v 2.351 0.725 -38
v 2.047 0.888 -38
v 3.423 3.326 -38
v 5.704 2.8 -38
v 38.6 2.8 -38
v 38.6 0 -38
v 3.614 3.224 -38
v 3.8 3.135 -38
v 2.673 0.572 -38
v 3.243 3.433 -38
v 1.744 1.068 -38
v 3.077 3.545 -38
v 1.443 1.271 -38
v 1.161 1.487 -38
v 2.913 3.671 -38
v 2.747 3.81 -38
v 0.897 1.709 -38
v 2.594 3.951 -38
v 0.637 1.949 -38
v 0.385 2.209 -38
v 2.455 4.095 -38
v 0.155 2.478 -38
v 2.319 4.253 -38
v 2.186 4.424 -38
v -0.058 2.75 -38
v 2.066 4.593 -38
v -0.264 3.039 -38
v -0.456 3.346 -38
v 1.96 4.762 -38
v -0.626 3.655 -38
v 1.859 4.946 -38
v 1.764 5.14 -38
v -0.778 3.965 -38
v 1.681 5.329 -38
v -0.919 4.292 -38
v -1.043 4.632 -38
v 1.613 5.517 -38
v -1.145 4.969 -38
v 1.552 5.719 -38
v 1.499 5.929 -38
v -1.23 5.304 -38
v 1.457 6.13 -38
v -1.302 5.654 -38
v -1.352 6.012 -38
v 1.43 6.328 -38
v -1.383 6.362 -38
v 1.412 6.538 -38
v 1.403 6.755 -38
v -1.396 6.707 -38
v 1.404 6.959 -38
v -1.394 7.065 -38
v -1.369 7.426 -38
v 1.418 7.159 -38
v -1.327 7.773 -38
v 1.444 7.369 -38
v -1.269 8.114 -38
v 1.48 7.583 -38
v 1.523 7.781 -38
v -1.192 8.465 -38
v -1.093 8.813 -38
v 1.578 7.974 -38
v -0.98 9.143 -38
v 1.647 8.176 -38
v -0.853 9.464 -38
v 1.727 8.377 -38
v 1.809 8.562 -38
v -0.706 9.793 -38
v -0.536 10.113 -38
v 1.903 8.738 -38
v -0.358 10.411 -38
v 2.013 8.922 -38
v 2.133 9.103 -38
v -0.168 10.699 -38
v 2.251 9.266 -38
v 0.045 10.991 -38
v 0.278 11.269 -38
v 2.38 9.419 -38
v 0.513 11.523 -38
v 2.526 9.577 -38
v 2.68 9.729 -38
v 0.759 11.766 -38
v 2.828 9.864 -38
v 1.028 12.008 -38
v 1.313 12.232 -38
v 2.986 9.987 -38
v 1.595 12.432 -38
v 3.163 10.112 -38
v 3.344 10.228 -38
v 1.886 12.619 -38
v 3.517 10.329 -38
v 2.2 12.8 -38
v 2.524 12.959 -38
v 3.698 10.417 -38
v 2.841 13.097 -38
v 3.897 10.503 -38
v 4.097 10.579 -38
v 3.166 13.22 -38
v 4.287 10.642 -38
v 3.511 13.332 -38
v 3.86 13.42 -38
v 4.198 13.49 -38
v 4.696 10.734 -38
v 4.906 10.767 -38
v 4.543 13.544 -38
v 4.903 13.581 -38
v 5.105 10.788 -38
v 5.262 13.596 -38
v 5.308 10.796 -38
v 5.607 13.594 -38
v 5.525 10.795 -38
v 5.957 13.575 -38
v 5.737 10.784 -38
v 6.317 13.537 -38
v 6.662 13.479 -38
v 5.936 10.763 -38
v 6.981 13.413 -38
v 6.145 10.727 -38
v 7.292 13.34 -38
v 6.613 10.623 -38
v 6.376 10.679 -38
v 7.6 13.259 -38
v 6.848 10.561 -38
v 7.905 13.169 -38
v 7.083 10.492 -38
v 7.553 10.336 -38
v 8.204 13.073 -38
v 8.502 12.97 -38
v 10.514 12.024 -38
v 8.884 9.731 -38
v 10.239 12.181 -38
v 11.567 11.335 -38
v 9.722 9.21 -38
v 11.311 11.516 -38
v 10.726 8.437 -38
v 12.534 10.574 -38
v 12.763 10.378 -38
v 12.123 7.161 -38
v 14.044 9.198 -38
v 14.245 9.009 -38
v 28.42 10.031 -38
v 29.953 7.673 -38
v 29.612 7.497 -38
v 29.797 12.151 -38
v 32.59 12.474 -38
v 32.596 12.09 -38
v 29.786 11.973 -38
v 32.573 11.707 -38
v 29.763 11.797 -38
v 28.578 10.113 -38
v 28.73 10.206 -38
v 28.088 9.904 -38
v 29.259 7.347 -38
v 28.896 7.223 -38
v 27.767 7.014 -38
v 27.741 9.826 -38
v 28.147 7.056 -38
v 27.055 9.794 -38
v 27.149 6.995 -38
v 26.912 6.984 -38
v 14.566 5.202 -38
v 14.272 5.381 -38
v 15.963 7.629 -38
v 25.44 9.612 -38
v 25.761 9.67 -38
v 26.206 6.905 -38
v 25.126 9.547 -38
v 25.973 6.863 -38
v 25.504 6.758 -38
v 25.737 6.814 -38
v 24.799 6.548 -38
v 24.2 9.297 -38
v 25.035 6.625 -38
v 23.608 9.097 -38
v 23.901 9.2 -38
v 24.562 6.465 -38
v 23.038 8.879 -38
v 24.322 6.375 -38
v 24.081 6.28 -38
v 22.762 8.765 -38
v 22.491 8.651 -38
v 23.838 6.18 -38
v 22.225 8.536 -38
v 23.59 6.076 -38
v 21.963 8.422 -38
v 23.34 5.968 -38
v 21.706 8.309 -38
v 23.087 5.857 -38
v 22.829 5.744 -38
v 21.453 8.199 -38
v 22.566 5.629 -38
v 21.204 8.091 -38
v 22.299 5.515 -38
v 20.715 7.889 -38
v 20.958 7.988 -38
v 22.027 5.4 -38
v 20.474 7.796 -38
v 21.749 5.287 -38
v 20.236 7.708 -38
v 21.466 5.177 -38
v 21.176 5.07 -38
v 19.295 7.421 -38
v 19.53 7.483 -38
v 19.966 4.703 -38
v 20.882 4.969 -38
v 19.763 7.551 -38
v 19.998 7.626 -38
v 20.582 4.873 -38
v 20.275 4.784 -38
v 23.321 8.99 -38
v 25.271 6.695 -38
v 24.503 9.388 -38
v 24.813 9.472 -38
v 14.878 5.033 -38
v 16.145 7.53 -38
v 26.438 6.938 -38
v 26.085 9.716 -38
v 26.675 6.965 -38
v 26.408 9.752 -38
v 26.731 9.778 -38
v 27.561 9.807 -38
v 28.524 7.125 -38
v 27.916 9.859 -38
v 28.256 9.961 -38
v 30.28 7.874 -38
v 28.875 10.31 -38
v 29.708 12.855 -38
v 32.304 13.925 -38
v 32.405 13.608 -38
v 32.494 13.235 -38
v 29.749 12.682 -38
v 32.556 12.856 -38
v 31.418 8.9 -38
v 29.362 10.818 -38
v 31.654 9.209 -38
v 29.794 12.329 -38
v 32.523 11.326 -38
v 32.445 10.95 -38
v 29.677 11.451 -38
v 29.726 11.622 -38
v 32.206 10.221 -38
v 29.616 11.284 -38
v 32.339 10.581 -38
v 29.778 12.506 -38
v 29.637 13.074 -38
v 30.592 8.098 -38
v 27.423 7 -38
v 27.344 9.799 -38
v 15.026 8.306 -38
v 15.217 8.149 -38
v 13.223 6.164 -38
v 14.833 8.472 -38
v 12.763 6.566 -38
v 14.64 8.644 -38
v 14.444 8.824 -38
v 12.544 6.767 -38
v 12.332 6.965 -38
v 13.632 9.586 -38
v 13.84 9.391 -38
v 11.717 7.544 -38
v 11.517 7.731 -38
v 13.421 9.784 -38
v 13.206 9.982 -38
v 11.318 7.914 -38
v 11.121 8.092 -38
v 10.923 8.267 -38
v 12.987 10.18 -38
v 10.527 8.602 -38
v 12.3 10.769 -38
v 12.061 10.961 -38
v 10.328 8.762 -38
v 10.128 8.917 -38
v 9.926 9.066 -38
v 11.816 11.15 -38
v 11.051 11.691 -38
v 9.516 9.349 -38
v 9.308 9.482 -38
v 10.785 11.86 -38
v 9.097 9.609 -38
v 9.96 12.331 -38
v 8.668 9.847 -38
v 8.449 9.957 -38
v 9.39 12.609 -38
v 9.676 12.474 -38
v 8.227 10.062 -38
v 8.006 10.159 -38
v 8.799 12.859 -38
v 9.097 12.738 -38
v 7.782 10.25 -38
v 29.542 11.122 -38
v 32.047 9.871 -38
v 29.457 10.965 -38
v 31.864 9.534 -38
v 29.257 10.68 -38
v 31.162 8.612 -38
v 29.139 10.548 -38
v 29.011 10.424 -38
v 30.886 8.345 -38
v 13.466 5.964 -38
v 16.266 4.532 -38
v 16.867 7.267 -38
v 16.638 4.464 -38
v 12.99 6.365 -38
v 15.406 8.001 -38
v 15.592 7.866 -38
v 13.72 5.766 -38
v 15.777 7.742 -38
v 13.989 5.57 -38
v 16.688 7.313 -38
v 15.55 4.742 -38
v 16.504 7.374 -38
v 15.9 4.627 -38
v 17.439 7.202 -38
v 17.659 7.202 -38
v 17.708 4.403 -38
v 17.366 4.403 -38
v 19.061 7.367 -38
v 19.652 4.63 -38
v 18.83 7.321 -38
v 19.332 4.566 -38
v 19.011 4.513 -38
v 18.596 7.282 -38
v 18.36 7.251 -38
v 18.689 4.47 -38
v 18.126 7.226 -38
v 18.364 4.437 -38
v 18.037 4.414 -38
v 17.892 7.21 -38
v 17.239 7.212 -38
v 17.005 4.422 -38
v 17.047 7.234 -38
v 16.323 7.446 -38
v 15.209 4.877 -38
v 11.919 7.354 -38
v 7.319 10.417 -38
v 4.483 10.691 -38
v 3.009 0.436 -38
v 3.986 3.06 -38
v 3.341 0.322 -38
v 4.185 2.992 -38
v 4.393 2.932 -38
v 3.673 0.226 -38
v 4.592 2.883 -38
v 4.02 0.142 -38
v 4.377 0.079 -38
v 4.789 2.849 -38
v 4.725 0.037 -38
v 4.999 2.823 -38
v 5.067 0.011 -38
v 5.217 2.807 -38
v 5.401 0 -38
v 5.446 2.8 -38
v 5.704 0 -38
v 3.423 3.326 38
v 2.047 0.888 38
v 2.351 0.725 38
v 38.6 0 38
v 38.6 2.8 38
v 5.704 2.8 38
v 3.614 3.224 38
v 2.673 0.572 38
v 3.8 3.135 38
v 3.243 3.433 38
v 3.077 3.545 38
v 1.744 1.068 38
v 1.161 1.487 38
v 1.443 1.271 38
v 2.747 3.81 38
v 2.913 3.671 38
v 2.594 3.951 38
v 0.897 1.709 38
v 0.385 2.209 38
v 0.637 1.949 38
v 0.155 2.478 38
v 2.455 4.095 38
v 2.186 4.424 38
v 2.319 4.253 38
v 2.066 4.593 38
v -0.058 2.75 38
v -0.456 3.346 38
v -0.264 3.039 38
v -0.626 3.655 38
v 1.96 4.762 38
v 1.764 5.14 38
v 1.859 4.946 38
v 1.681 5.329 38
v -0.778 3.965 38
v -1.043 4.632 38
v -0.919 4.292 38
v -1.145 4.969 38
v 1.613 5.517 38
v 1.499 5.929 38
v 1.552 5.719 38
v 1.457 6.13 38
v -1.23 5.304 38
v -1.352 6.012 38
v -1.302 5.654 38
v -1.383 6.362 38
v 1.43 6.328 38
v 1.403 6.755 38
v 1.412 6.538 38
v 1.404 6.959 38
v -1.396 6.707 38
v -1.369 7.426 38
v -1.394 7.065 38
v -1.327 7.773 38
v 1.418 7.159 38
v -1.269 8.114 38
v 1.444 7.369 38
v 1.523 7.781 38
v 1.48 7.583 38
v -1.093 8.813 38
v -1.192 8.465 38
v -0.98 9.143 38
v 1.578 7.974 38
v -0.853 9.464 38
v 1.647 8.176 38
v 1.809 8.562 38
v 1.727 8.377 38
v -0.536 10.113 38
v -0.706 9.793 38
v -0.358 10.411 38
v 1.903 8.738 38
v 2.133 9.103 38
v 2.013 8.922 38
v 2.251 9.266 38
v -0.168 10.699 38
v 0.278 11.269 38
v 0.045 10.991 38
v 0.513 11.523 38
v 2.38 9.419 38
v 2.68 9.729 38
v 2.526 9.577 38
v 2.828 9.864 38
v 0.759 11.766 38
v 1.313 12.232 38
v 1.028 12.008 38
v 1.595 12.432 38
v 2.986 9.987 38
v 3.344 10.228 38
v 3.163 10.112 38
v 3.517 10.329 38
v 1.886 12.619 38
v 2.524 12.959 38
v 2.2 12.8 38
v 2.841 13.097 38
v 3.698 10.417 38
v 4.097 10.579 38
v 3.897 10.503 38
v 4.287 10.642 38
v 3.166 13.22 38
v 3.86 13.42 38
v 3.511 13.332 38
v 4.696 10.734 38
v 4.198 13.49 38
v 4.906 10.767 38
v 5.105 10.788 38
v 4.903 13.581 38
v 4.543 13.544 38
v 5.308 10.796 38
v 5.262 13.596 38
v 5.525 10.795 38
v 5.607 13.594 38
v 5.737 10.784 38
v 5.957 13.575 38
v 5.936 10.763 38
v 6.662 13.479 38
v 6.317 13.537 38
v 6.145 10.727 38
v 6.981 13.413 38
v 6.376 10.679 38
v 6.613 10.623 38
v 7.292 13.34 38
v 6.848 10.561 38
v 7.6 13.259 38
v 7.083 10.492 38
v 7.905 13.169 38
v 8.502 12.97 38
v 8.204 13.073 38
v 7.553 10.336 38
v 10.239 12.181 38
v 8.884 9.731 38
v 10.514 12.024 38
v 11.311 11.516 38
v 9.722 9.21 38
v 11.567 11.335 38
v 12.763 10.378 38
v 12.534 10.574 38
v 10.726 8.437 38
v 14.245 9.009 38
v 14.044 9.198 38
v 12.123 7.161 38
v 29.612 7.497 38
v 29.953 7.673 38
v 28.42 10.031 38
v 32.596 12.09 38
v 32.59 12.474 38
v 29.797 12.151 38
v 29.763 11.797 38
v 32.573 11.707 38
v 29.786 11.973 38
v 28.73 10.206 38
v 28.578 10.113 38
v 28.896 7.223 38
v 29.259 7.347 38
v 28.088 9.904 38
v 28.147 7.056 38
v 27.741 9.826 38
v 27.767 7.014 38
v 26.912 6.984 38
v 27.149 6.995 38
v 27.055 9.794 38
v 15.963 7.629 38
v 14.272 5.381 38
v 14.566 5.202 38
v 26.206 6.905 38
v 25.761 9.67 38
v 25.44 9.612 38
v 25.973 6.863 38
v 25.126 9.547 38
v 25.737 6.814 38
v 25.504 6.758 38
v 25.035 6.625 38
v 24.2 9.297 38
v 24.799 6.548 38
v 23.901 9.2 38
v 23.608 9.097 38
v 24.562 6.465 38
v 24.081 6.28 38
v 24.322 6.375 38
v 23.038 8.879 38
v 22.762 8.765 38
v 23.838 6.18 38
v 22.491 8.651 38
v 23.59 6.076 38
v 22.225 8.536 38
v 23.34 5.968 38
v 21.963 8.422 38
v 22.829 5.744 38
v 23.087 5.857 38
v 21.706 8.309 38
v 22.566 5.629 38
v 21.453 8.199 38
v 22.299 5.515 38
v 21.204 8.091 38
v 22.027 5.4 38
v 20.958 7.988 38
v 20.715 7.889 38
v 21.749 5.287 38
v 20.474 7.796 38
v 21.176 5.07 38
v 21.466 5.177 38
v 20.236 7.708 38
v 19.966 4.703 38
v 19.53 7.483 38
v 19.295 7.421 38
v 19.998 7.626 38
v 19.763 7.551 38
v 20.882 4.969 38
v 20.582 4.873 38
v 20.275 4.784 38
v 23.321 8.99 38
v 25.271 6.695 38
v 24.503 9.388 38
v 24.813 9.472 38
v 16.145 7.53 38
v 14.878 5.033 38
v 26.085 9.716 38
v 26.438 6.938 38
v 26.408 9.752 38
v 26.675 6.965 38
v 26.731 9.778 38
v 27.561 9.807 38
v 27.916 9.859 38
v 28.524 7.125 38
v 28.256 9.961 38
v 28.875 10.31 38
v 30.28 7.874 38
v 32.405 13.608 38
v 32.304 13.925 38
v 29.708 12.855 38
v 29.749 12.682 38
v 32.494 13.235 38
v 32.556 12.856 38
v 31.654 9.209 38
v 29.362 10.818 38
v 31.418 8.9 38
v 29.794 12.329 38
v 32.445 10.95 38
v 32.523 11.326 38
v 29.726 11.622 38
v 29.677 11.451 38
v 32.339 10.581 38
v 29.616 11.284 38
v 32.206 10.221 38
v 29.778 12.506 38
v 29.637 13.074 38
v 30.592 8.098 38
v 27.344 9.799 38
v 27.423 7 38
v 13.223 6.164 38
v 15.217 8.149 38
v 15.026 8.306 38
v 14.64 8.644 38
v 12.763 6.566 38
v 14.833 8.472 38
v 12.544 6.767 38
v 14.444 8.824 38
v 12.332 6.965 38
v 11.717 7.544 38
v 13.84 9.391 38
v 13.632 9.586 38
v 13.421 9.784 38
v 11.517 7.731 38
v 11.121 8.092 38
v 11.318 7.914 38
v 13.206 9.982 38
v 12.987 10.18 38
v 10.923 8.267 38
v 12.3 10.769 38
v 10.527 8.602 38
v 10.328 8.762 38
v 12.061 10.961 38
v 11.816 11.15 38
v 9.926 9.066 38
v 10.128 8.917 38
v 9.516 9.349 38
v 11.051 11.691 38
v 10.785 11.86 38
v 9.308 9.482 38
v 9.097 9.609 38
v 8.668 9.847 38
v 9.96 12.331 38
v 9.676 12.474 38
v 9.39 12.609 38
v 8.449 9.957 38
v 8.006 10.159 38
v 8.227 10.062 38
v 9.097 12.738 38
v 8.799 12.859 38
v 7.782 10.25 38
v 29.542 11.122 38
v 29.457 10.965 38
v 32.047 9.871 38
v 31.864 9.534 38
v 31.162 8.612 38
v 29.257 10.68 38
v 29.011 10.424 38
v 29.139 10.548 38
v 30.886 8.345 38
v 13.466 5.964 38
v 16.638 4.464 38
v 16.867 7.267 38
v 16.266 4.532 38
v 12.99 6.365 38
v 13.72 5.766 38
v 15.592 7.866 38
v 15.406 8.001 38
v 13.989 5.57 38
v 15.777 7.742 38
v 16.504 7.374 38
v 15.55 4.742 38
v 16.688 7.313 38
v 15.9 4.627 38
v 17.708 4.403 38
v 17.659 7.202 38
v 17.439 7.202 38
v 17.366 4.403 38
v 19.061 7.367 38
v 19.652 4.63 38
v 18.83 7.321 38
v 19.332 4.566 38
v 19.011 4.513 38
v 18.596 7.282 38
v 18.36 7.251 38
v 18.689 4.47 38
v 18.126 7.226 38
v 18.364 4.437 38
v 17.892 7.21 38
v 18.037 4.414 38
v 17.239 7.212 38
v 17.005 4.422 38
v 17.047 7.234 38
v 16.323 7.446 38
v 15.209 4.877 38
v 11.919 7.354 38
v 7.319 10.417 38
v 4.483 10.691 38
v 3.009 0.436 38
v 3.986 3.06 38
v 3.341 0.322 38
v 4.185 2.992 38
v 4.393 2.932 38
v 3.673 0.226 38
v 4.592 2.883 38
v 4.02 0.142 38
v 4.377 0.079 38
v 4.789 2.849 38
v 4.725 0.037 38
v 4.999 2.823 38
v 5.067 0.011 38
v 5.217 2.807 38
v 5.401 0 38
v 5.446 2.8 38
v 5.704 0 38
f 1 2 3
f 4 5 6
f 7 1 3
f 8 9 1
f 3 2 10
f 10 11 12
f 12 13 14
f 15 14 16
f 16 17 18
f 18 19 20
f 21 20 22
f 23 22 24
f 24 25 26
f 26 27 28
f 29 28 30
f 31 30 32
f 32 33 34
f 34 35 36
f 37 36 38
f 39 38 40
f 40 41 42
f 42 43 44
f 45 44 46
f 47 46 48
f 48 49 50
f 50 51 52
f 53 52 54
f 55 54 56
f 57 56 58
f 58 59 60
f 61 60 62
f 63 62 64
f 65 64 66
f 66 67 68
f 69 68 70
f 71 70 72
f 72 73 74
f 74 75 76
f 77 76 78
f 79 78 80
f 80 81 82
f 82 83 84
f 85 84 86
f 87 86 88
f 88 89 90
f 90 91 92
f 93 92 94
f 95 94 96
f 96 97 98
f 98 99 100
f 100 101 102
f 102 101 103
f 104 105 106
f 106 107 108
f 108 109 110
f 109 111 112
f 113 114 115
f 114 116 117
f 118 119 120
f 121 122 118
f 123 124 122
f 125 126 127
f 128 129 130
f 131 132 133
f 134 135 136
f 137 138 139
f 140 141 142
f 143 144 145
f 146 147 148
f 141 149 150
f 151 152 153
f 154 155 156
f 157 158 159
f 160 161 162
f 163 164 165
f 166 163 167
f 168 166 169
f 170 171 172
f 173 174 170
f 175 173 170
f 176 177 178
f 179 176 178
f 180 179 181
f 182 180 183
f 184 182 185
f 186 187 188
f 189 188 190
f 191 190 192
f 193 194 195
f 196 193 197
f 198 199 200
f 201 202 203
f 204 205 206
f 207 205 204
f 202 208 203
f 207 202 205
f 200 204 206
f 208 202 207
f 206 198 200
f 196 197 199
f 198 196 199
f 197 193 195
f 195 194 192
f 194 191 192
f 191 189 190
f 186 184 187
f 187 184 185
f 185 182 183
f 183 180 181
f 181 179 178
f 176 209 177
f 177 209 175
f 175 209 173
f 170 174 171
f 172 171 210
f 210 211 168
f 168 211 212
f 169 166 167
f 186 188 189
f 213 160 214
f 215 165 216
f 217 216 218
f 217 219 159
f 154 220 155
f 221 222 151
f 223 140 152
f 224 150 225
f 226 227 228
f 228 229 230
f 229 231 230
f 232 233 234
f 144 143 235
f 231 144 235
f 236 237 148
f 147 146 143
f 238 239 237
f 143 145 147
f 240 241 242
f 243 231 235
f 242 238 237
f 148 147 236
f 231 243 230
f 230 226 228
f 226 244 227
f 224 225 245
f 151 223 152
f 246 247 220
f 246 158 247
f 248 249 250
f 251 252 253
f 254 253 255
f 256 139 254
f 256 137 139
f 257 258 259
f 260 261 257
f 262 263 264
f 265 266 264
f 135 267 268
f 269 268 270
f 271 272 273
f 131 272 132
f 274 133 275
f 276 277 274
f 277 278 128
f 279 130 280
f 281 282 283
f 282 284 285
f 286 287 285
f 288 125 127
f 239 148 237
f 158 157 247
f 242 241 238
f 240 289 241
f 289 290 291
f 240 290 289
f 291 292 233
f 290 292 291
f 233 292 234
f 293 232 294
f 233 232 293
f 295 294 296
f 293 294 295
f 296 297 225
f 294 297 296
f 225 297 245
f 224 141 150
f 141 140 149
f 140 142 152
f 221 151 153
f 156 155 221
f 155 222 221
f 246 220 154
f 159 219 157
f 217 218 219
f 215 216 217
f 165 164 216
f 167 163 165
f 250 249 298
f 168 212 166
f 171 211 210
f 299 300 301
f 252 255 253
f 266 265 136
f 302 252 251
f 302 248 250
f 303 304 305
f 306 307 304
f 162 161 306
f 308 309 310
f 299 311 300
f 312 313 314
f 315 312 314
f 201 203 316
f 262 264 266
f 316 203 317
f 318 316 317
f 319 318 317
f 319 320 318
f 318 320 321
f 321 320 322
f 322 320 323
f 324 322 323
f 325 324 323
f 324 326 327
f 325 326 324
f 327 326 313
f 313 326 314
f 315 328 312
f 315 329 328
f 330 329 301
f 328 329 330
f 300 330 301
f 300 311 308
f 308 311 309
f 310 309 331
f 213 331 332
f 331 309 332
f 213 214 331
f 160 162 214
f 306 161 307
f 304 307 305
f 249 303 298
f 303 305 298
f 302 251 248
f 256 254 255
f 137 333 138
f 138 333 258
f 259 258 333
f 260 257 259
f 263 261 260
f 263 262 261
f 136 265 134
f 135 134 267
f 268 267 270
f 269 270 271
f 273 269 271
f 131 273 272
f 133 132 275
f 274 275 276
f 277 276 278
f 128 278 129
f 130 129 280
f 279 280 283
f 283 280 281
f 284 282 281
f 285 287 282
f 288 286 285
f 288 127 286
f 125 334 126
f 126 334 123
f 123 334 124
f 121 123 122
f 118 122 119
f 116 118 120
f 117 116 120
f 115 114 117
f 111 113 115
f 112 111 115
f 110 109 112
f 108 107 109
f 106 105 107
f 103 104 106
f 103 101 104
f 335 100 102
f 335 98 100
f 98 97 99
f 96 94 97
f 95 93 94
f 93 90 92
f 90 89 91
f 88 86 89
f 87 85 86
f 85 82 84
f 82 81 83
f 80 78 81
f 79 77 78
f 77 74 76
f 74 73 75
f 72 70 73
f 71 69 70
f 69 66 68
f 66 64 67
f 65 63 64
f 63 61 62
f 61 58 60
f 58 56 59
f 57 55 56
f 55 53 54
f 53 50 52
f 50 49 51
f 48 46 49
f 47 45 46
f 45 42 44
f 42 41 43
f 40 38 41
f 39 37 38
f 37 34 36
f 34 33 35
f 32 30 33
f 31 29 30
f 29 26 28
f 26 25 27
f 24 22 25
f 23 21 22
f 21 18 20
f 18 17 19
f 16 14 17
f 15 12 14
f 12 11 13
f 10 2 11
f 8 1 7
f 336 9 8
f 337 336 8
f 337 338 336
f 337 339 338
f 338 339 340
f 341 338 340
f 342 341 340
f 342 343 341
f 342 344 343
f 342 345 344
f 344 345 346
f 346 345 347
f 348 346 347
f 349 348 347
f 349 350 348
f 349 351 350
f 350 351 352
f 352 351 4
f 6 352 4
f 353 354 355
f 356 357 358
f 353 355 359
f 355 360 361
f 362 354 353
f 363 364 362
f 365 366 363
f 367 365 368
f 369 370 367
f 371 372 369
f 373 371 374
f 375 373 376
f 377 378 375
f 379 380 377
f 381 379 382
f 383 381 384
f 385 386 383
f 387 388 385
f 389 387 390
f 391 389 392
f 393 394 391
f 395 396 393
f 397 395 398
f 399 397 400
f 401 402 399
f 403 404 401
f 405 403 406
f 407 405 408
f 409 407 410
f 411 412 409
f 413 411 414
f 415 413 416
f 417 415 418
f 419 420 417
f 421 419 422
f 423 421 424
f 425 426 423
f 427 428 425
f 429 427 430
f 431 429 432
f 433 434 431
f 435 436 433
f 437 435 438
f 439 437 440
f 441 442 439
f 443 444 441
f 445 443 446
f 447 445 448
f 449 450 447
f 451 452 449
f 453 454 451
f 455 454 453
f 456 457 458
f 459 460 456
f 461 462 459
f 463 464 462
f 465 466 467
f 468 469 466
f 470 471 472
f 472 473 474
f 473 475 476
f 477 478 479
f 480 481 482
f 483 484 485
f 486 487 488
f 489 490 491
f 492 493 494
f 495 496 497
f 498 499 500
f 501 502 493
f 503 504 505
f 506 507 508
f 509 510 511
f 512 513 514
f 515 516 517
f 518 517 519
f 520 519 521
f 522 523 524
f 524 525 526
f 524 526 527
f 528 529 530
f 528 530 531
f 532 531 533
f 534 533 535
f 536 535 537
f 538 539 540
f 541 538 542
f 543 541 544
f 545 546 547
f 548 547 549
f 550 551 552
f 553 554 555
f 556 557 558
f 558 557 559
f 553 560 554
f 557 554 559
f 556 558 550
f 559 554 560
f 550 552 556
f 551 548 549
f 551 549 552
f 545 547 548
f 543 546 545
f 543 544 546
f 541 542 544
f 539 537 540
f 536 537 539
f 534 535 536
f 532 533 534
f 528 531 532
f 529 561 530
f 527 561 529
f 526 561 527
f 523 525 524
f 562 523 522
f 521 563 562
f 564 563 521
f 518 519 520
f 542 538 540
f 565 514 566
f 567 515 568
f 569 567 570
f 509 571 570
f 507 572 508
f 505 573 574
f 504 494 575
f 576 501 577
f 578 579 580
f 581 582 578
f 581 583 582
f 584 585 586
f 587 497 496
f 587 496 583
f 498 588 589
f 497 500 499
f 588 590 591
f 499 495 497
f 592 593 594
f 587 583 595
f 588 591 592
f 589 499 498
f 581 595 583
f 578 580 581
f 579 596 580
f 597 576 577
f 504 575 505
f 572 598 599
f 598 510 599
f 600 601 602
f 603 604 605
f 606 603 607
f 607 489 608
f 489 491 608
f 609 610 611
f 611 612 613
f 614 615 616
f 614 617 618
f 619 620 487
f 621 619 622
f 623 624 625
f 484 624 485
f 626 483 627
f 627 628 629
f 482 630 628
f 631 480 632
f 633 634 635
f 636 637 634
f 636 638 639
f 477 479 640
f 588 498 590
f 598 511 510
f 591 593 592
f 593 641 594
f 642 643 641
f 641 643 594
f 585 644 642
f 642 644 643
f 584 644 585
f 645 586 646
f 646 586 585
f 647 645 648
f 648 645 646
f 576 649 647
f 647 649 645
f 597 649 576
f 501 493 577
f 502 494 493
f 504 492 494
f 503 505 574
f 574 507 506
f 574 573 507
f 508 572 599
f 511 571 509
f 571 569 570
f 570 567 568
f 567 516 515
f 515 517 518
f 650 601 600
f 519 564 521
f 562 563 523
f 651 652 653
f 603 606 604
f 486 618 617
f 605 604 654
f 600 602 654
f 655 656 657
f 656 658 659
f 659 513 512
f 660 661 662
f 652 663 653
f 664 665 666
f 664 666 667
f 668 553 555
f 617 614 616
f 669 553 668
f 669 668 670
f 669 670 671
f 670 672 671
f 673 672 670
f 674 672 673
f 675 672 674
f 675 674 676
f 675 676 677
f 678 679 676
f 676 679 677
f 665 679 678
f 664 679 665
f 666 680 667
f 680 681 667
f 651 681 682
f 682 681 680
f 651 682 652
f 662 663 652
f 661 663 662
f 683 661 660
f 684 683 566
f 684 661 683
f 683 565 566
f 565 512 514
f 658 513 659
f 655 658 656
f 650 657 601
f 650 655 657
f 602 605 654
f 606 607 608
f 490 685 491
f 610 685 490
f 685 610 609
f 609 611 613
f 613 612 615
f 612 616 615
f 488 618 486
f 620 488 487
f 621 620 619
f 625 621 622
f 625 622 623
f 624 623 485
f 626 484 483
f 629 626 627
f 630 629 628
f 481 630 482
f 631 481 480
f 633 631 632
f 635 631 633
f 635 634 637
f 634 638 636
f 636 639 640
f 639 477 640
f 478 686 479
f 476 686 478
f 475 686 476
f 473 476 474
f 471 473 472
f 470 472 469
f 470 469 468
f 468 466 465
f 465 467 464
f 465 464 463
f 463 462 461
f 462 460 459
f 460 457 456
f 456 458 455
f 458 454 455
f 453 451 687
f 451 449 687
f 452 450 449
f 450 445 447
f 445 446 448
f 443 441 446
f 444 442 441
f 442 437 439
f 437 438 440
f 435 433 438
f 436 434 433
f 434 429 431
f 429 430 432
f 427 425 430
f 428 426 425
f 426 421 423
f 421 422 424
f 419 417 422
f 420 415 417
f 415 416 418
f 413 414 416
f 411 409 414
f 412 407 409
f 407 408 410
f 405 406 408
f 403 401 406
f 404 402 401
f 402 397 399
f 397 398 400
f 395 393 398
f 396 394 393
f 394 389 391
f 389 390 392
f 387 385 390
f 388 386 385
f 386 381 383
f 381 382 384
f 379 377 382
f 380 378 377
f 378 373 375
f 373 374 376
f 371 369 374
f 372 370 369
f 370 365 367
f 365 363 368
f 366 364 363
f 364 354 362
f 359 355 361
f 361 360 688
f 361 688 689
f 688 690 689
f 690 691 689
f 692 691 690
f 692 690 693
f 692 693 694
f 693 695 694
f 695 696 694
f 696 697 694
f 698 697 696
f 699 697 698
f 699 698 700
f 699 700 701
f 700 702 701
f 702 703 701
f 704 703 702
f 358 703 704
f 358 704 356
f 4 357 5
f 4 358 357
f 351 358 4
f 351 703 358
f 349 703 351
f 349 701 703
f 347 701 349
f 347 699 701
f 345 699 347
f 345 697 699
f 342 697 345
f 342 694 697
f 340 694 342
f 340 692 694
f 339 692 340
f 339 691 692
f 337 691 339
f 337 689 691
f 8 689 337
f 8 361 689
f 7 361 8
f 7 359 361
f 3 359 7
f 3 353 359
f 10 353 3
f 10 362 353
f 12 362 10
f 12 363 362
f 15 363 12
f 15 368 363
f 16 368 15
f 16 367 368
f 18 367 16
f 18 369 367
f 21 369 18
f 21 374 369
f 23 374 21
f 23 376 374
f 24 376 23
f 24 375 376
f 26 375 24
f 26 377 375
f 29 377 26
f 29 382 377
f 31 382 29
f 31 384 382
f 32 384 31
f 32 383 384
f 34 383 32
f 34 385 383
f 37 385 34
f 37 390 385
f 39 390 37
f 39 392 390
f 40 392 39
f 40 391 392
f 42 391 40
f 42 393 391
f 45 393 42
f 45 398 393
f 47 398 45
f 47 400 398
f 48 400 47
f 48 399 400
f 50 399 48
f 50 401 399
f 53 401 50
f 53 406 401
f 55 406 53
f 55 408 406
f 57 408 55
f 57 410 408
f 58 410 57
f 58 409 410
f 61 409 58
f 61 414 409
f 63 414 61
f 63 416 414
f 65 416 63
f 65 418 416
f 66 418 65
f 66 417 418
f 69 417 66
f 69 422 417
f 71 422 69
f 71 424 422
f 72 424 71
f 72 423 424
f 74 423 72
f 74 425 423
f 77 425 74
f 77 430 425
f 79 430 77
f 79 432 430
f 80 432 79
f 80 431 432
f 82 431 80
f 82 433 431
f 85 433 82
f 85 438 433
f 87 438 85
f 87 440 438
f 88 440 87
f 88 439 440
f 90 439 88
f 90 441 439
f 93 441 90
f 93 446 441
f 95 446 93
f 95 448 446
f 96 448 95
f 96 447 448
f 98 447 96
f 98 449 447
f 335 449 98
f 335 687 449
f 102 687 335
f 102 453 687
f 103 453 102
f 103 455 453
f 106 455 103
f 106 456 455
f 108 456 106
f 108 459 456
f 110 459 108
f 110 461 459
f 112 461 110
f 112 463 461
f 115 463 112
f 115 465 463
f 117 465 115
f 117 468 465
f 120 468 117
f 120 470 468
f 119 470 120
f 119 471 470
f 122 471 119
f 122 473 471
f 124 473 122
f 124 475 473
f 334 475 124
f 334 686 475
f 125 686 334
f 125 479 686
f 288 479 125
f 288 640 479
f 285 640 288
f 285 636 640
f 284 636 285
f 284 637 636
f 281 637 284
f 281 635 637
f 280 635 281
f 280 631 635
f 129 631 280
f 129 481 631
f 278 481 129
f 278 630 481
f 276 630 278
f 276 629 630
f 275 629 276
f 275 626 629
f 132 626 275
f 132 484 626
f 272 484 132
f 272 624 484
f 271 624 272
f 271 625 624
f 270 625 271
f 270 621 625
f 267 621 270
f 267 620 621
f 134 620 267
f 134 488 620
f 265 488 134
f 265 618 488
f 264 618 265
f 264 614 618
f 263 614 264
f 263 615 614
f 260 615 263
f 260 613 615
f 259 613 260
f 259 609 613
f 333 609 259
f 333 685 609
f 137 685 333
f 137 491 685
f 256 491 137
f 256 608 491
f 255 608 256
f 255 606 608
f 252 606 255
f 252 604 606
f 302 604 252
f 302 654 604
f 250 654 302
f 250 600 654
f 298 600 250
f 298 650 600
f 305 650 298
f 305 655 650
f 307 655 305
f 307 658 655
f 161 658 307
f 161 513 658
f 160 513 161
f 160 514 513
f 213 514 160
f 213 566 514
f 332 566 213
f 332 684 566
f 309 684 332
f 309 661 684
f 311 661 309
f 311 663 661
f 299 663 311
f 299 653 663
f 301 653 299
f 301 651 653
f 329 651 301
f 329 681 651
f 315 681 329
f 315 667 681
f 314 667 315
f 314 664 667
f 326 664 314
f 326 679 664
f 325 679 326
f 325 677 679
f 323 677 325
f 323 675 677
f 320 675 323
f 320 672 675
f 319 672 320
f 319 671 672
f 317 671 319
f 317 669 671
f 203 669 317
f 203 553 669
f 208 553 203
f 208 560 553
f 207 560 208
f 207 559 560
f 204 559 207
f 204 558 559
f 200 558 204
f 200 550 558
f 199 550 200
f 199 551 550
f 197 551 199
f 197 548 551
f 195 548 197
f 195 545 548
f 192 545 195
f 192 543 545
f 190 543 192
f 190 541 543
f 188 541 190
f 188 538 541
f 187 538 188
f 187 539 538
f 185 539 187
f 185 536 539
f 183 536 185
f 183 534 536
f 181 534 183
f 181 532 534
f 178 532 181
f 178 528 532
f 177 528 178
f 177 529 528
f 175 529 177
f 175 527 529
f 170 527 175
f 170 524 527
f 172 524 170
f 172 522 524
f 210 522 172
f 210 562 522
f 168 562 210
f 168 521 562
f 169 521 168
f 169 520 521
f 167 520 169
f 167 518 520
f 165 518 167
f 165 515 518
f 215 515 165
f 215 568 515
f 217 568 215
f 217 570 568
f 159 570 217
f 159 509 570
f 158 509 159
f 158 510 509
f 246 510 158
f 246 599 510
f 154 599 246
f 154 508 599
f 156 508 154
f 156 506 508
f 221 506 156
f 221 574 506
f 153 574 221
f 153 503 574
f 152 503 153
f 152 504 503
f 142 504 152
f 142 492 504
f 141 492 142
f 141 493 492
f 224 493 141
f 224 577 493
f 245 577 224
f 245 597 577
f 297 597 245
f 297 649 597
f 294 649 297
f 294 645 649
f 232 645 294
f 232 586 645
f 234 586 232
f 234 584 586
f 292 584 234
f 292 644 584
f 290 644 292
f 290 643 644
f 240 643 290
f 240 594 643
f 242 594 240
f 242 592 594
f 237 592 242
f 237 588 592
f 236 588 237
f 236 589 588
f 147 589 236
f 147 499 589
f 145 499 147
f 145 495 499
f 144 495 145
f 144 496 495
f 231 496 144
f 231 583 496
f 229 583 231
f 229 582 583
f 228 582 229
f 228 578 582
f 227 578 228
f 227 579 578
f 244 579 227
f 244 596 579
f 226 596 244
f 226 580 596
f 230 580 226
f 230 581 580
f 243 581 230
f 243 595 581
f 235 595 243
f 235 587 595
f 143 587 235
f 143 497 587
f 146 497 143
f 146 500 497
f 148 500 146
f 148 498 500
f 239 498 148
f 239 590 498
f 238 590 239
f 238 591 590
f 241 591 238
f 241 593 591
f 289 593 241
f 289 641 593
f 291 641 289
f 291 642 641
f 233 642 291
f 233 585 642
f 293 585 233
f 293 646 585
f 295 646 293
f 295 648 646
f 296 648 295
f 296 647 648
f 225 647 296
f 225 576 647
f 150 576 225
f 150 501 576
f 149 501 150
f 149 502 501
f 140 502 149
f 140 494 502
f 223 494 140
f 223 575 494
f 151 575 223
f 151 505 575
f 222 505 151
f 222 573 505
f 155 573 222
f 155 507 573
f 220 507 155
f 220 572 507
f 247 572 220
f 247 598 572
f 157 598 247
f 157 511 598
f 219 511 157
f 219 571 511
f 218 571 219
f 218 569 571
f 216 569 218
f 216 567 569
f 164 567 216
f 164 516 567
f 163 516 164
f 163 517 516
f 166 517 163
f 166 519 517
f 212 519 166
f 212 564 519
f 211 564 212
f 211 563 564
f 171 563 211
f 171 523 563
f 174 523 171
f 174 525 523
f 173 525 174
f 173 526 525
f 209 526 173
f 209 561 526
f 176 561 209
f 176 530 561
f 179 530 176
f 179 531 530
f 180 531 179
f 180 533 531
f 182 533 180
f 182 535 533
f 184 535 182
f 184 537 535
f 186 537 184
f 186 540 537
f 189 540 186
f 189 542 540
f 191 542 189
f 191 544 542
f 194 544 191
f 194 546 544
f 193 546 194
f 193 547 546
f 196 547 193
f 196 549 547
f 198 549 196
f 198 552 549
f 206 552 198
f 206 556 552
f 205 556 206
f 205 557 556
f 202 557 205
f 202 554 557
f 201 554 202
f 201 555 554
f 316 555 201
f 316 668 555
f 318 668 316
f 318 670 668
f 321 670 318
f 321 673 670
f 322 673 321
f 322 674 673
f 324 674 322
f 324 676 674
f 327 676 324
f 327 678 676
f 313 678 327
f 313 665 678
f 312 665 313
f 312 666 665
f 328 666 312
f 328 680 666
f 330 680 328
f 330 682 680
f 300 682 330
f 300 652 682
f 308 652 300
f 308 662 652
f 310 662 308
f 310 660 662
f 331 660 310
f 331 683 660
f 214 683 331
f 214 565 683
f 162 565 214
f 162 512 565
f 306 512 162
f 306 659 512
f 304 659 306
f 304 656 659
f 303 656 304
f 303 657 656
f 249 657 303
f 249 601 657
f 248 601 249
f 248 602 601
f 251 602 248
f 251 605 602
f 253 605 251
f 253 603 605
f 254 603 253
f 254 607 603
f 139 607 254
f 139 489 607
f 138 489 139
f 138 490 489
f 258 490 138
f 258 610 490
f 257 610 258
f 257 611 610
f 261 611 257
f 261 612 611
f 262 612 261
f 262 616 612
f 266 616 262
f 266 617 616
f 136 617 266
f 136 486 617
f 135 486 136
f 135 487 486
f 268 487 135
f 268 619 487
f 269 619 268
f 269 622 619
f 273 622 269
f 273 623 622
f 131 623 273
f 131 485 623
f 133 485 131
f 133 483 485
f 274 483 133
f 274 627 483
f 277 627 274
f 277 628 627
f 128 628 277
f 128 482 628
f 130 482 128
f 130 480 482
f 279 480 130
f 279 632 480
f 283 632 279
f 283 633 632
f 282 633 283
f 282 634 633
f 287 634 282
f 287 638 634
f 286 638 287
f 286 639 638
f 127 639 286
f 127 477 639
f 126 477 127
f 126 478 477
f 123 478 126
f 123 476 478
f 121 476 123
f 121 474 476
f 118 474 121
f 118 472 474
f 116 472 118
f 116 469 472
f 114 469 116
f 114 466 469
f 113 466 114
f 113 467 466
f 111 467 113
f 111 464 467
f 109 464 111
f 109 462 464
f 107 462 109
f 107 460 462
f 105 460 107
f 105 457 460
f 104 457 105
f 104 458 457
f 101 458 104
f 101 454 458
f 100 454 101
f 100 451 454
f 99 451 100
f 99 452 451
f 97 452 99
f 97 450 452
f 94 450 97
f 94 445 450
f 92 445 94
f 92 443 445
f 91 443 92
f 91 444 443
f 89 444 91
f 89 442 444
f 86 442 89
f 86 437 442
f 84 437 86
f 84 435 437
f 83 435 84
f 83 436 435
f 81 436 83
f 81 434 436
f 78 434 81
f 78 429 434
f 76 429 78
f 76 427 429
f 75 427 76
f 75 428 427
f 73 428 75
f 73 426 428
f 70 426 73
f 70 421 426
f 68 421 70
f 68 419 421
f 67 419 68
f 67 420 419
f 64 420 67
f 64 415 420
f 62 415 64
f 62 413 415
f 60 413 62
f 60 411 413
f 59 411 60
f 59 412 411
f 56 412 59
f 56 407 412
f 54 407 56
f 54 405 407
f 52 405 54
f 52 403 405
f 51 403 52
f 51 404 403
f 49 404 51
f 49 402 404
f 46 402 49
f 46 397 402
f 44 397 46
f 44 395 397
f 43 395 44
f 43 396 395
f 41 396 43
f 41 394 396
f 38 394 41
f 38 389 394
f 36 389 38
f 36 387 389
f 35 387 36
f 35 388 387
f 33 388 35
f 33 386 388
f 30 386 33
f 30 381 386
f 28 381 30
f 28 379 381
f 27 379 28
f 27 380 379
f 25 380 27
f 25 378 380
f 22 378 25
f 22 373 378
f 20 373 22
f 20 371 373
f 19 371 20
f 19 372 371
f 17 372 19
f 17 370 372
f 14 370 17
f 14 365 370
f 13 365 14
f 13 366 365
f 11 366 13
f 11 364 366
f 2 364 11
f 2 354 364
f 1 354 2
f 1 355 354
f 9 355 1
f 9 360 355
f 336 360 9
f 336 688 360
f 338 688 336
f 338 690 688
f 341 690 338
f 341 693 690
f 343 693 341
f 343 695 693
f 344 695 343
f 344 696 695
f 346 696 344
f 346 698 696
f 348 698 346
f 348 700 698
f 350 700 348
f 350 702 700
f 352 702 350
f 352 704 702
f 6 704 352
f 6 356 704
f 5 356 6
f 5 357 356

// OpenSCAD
// Auto-generated from generate.py — postit-wall-clip-wide
// Edit generate.py (or the numbers below) and re-run to rebuild the STL.

width = 76.000;
thickness = 2.800; // ribbon thickness, baked into the polygon
$fn = 48;

module clip_profile() {
  polygon([
    [38.6000, 0.0000],
    [38.3188, 0.0000],
    [38.0377, 0.0000],
    [37.7565, 0.0000],
    [37.4754, 0.0000],
    [37.1942, 0.0000],
    [36.9131, 0.0000],
    [36.6319, 0.0000],
    [36.3507, 0.0000],
    [36.0696, 0.0000],
    [35.7884, 0.0000],
    [35.5073, 0.0000],
    [35.2261, 0.0000],
    [34.9449, 0.0000],
    [34.6638, 0.0000],
    [34.3826, 0.0000],
    [34.1015, 0.0000],
    [33.8203, 0.0000],
    [33.5392, 0.0000],
    [33.2580, 0.0000],
    [32.9768, 0.0000],
    [32.6957, 0.0000],
    [32.4145, 0.0000],
    [32.1334, 0.0000],
    [31.8522, 0.0000],
    [31.5710, 0.0000],
    [31.2899, 0.0000],
    [31.0087, 0.0000],
    [30.7276, 0.0000],
    [30.4464, 0.0000],
    [30.1653, 0.0000],
    [29.8841, 0.0000],
    [29.6029, 0.0000],
    [29.3218, 0.0000],
    [29.0406, 0.0000],
    [28.7595, 0.0000],
    [28.4783, 0.0000],
    [28.1971, 0.0000],
    [27.9160, 0.0000],
    [27.6348, 0.0000],
    [27.3537, 0.0000],
    [27.0725, 0.0000],
    [26.7914, 0.0000],
    [26.5102, 0.0000],
    [26.2290, 0.0000],
    [25.9479, 0.0000],
    [25.6667, 0.0000],
    [25.3856, 0.0000],
    [25.1044, 0.0000],
    [24.8232, 0.0000],
    [24.5421, 0.0000],
    [24.2609, 0.0000],
    [23.9798, 0.0000],
    [23.6986, 0.0000],
    [23.4175, 0.0000],
    [23.1363, 0.0000],
    [22.8551, 0.0000],
    [22.5740, 0.0000],
    [22.2928, 0.0000],
    [22.0117, 0.0000],
    [21.7305, 0.0000],
    [21.4493, 0.0000],
    [21.1682, 0.0000],
    [20.8870, 0.0000],
    [20.6059, 0.0000],
    [20.3247, 0.0000],
    [20.0436, 0.0000],
    [19.7624, 0.0000],
    [19.4812, 0.0000],
    [19.2001, 0.0000],
    [18.9189, 0.0000],
    [18.6378, 0.0000],
    [18.3566, 0.0000],
    [18.0754, 0.0000],
    [17.7943, 0.0000],
    [17.5131, 0.0000],
    [17.2320, 0.0000],
    [16.9508, 0.0000],
    [16.6697, 0.0000],
    [16.3885, 0.0000],
    [16.1073, 0.0000],
    [15.8262, 0.0000],
    [15.5450, 0.0000],
    [15.2639, 0.0000],
    [14.9827, 0.0000],
    [14.7015, 0.0000],
    [14.4204, 0.0000],
    [14.1392, 0.0000],
    [13.8581, 0.0000],
    [13.5769, 0.0000],
    [13.2958, 0.0000],
    [13.0146, 0.0000],
    [12.7334, 0.0000],
    [12.4523, 0.0000],
    [12.1711, 0.0000],
    [11.8900, 0.0000],
    [11.6088, 0.0000],
    [11.3277, 0.0000],
    [11.0465, 0.0000],
    [10.7653, 0.0000],
    [10.4842, 0.0000],
    [10.2030, 0.0000],
    [9.9219, 0.0000],
    [9.6407, 0.0000],
    [9.3595, 0.0000],
    [9.0784, 0.0000],
    [8.7972, 0.0000],
    [8.5161, 0.0000],
    [8.2349, 0.0000],
    [7.9538, 0.0000],
    [7.6726, 0.0000],
    [7.3914, 0.0000],
    [7.1103, 0.0000],
    [6.8291, 0.0000],
    [6.5480, 0.0000],
    [6.2668, 0.0000],
    [5.9856, 0.0000],
    [5.7045, 0.0000],
    [5.4009, 0.0002],
    [5.0673, 0.0110],
    [4.7249, 0.0368],
    [4.3769, 0.0793],
    [4.0202, 0.1424],
    [3.6730, 0.2260],
    [3.3414, 0.3225],
    [3.0086, 0.4363],
    [2.6728, 0.5721],
    [2.3514, 0.7250],
    [2.0467, 0.8879],
    [1.7437, 1.0685],
    [1.4435, 1.2711],
    [1.1614, 1.4866],
    [0.8970, 1.7088],
    [0.6370, 1.9488],
    [0.3854, 2.2094],
    [0.1546, 2.4776],
    [-0.0583, 2.7496],
    [-0.2637, 3.0390],
    [-0.4557, 3.3462],
    [-0.6256, 3.6554],
    [-0.7778, 3.9655],
    [-0.9194, 4.2920],
    [-1.0434, 4.6324],
    [-1.1455, 4.9690],
    [-1.2304, 5.3038],
    [-1.3017, 5.6536],
    [-1.3523, 6.0123],
    [-1.3826, 6.3616],
    [-1.3965, 6.7068],
    [-1.3941, 7.0649],
    [-1.3690, 7.4263],
    [-1.3267, 7.7733],
    [-1.2690, 8.1138],
    [-1.1925, 8.4648],
    [-1.0929, 8.8131],
    [-0.9802, 9.1428],
    [-0.8535, 9.4642],
    [-0.7056, 9.7927],
    [-0.5359, 10.1127],
    [-0.3580, 10.4112],
    [-0.1677, 10.6994],
    [0.0454, 10.9912],
    [0.2780, 11.2690],
    [0.5129, 11.5235],
    [0.7587, 11.7664],
    [1.0283, 12.0084],
    [1.3132, 12.2318],
    [1.5949, 12.4317],
    [1.8865, 12.6192],
    [2.2004, 12.8000],
    [2.5244, 12.9592],
    [2.8413, 13.0967],
    [3.1664, 13.2203],
    [3.5110, 13.3319],
    [3.8599, 13.4205],
    [4.1983, 13.4897],
    [4.5429, 13.5436],
    [4.9032, 13.5812],
    [5.2618, 13.5958],
    [5.6072, 13.5936],
    [5.9566, 13.5752],
    [6.3168, 13.5371],
    [6.6621, 13.4789],
    [6.9813, 13.4132],
    [7.2916, 13.3398],
    [7.6000, 13.2586],
    [7.9048, 13.1690],
    [8.2040, 13.0733],
    [8.5020, 12.9701],
    [8.7993, 12.8587],
    [9.0967, 12.7380],
    [9.3896, 12.6089],
    [9.6764, 12.4736],
    [9.9597, 12.3309],
    [10.2392, 12.1809],
    [10.5144, 12.0240],
    [10.7850, 11.8605],
    [11.0507, 11.6909],
    [11.3113, 11.5156],
    [11.5666, 11.3352],
    [11.8165, 11.1503],
    [12.0611, 10.9614],
    [12.3002, 10.7693],
    [12.5341, 10.5745],
    [12.7629, 10.3779],
    [12.9868, 10.1800],
    [13.2062, 9.9817],
    [13.4212, 9.7836],
    [13.6323, 9.5865],
    [13.8398, 9.3911],
    [14.0440, 9.1983],
    [14.2453, 9.0088],
    [14.4441, 8.8236],
    [14.6397, 8.6445],
    [14.8334, 8.4720],
    [15.0261, 8.3063],
    [15.2174, 8.1488],
    [15.4065, 8.0011],
    [15.5919, 7.8658],
    [15.7769, 7.7423],
    [15.9631, 7.6290],
    [16.1446, 7.5299],
    [16.3228, 7.4460],
    [16.5042, 7.3739],
    [16.6885, 7.3133],
    [16.8667, 7.2668],
    [17.0475, 7.2343],
    [17.2386, 7.2124],
    [17.4393, 7.2021],
    [17.6594, 7.2023],
    [17.8922, 7.2105],
    [18.1259, 7.2265],
    [18.3605, 7.2506],
    [18.5960, 7.2822],
    [18.8299, 7.3209],
    [19.0615, 7.3670],
    [19.2948, 7.4213],
    [19.5298, 7.4827],
    [19.7632, 7.5506],
    [19.9982, 7.6260],
    [20.2359, 7.7079],
    [20.4738, 7.7956],
    [20.7147, 7.8894],
    [20.9580, 7.9881],
    [21.2037, 8.0913],
    [21.4533, 8.1987],
    [21.7063, 8.3091],
    [21.9631, 8.4218],
    [22.2246, 8.5362],
    [22.4909, 8.6511],
    [22.7616, 8.7654],
    [23.0385, 8.8790],
    [23.3208, 8.9897],
    [23.6076, 9.0969],
    [23.9015, 9.2002],
    [24.2000, 9.2972],
    [24.5029, 9.3880],
    [24.8127, 9.4718],
    [25.1257, 9.5466],
    [25.4403, 9.6124],
    [25.7613, 9.6697],
    [26.0852, 9.7160],
    [26.4078, 9.7520],
    [26.7312, 9.7779],
    [27.0551, 9.7938],
    [27.3437, 9.7992],
    [27.5614, 9.8068],
    [27.7407, 9.8263],
    [27.9158, 9.8586],
    [28.0881, 9.9036],
    [28.2565, 9.9612],
    [28.4203, 10.0310],
    [28.5785, 10.1127],
    [28.7303, 10.2057],
    [28.8749, 10.3097],
    [29.0114, 10.4240],
    [29.1392, 10.5481],
    [29.2566, 10.6800],
    [29.3619, 10.8182],
    [29.4569, 10.9655],
    [29.5423, 11.1219],
    [29.6159, 11.2841],
    [29.6774, 11.4512],
    [29.7264, 11.6224],
    [29.7628, 11.7966],
    [29.7862, 11.9731],
    [29.7967, 12.1508],
    [29.7940, 12.3289],
    [29.7782, 12.5063],
    [29.7495, 12.6821],
    [29.7079, 12.8553],
    [29.6372, 13.0738],
    [32.3045, 13.9255],
    [32.4048, 13.6084],
    [32.4944, 13.2350],
    [32.5563, 12.8560],
    [32.5902, 12.4736],
    [32.5960, 12.0898],
    [32.5735, 11.7066],
    [32.5230, 11.3261],
    [32.4446, 10.9504],
    [32.3388, 10.5814],
    [32.2063, 10.2211],
    [32.0475, 9.8715],
    [31.8636, 9.5345],
    [31.6536, 9.2095],
    [31.4182, 8.9003],
    [31.1620, 8.6120],
    [30.8865, 8.3446],
    [30.5921, 8.0981],
    [30.2804, 7.8740],
    [29.9532, 7.6734],
    [29.6121, 7.4973],
    [29.2590, 7.3468],
    [28.8958, 7.2227],
    [28.5244, 7.1255],
    [28.1468, 7.0559],
    [27.7673, 7.0144],
    [27.4232, 7.0003],
    [27.1495, 6.9954],
    [26.9118, 6.9837],
    [26.6748, 6.9647],
    [26.4385, 6.9384],
    [26.2059, 6.9052],
    [25.9733, 6.8635],
    [25.7375, 6.8142],
    [25.5036, 6.7584],
    [25.2707, 6.6953],
    [25.0350, 6.6246],
    [24.7987, 6.5478],
    [24.5622, 6.4646],
    [24.3222, 6.3749],
    [24.0810, 6.2803],
    [23.8377, 6.1805],
    [23.5904, 6.0760],
    [23.3404, 5.9681],
    [23.0868, 5.8571],
    [22.8287, 5.7439],
    [22.5662, 5.6294],
    [22.2993, 5.5146],
    [22.0266, 5.4000],
    [21.7488, 5.2873],
    [21.4657, 5.1771],
    [21.1760, 5.0705],
    [20.8820, 4.9691],
    [20.5817, 4.8729],
    [20.2750, 4.7837],
    [19.9661, 4.7029],
    [19.6517, 4.6299],
    [19.3319, 4.5663],
    [19.0110, 4.5131],
    [18.6893, 4.4700],
    [18.3645, 4.4367],
    [18.0372, 4.4142],
    [17.7081, 4.4027],
    [17.3660, 4.4031],
    [17.0053, 4.4221],
    [16.6380, 4.4644],
    [16.2656, 4.5321],
    [15.8996, 4.6267],
    [15.5498, 4.7416],
    [15.2089, 4.8771],
    [14.8784, 5.0326],
    [14.5661, 5.2024],
    [14.2719, 5.3811],
    [13.9893, 5.5698],
    [13.7203, 5.7658],
    [13.4662, 5.9640],
    [13.2234, 6.1638],
    [12.9897, 6.3647],
    [12.7634, 6.5662],
    [12.5443, 6.7667],
    [12.3316, 6.9649],
    [12.1234, 7.1607],
    [11.9188, 7.3540],
    [11.7169, 7.5441],
    [11.5170, 7.7308],
    [11.3185, 7.9137],
    [11.1208, 8.0925],
    [10.9233, 8.2670],
    [10.7257, 8.4369],
    [10.5275, 8.6019],
    [10.3283, 8.7620],
    [10.1278, 8.9169],
    [9.9257, 9.0664],
    [9.7218, 9.2105],
    [9.5159, 9.3491],
    [9.3076, 9.4820],
    [9.0970, 9.6093],
    [8.8837, 9.7309],
    [8.6678, 9.8468],
    [8.4490, 9.9570],
    [8.2272, 10.0616],
    [8.0056, 10.1594],
    [7.7820, 10.2501],
    [7.5527, 10.3359],
    [7.3194, 10.4167],
    [7.0831, 10.4923],
    [6.8484, 10.5614],
    [6.6131, 10.6233],
    [6.3762, 10.6793],
    [6.1448, 10.7271],
    [5.9358, 10.7631],
    [5.7369, 10.7838],
    [5.5250, 10.7948],
    [5.3084, 10.7962],
    [5.1052, 10.7885],
    [4.9062, 10.7673],
    [4.6956, 10.7342],
    [4.4834, 10.6908],
    [4.2872, 10.6416],
    [4.0970, 10.5795],
    [3.8967, 10.5032],
    [3.6981, 10.4170],
    [3.5171, 10.3289],
    [3.3441, 10.2285],
    [3.1629, 10.1120],
    [2.9863, 9.9866],
    [2.8283, 9.8637],
    [2.6799, 9.7294],
    [2.5260, 9.5774],
    [2.3797, 9.4189],
    [2.2507, 9.2659],
    [2.1328, 9.1032],
    [2.0135, 8.9225],
    [1.9035, 8.7382],
    [1.8093, 8.5617],
    [1.7270, 8.3772],
    [1.6475, 8.1758],
    [1.5783, 7.9737],
    [1.5229, 7.7815],
    [1.4802, 7.5830],
    [1.4440, 7.3695],
    [1.4181, 7.1586],
    [1.4039, 6.9590],
    [1.4031, 6.7549],
    [1.4118, 6.5385],
    [1.4299, 6.3278],
    [1.4575, 6.1297],
    [1.4990, 5.9288],
    [1.5522, 5.7189],
    [1.6130, 5.5175],
    [1.6813, 5.3294],
    [1.7638, 5.1404],
    [1.8592, 4.9460],
    [1.9597, 4.7624],
    [2.0657, 4.5927],
    [2.1860, 4.4239],
    [2.3194, 4.2534],
    [2.4550, 4.0953],
    [2.5940, 3.9513],
    [2.7473, 3.8103],
    [2.9131, 3.6710],
    [3.0775, 3.5449],
    [3.2434, 3.4331],
    [3.4234, 3.3261],
    [3.6144, 3.2240],
    [3.8004, 3.1350],
    [3.9859, 3.0602],
    [4.1851, 2.9923],
    [4.3930, 2.9318],
    [4.5923, 2.8834],
    [4.7894, 2.8488],
    [4.9993, 2.8234],
    [5.2173, 2.8070],
    [5.4457, 2.7998],
    [5.7045, 2.8000],
    [5.9856, 2.8000],
    [6.2668, 2.8000],
    [6.5480, 2.8000],
    [6.8291, 2.8000],
    [7.1103, 2.8000],
    [7.3914, 2.8000],
    [7.6726, 2.8000],
    [7.9538, 2.8000],
    [8.2349, 2.8000],
    [8.5161, 2.8000],
    [8.7972, 2.8000],
    [9.0784, 2.8000],
    [9.3595, 2.8000],
    [9.6407, 2.8000],
    [9.9219, 2.8000],
    [10.2030, 2.8000],
    [10.4842, 2.8000],
    [10.7653, 2.8000],
    [11.0465, 2.8000],
    [11.3277, 2.8000],
    [11.6088, 2.8000],
    [11.8900, 2.8000],
    [12.1711, 2.8000],
    [12.4523, 2.8000],
    [12.7334, 2.8000],
    [13.0146, 2.8000],
    [13.2958, 2.8000],
    [13.5769, 2.8000],
    [13.8581, 2.8000],
    [14.1392, 2.8000],
    [14.4204, 2.8000],
    [14.7015, 2.8000],
    [14.9827, 2.8000],
    [15.2639, 2.8000],
    [15.5450, 2.8000],
    [15.8262, 2.8000],
    [16.1073, 2.8000],
    [16.3885, 2.8000],
    [16.6697, 2.8000],
    [16.9508, 2.8000],
    [17.2320, 2.8000],
    [17.5131, 2.8000],
    [17.7943, 2.8000],
    [18.0754, 2.8000],
    [18.3566, 2.8000],
    [18.6378, 2.8000],
    [18.9189, 2.8000],
    [19.2001, 2.8000],
    [19.4812, 2.8000],
    [19.7624, 2.8000],
    [20.0436, 2.8000],
    [20.3247, 2.8000],
    [20.6059, 2.8000],
    [20.8870, 2.8000],
    [21.1682, 2.8000],
    [21.4493, 2.8000],
    [21.7305, 2.8000],
    [22.0117, 2.8000],
    [22.2928, 2.8000],
    [22.5740, 2.8000],
    [22.8551, 2.8000],
    [23.1363, 2.8000],
    [23.4175, 2.8000],
    [23.6986, 2.8000],
    [23.9798, 2.8000],
    [24.2609, 2.8000],
    [24.5421, 2.8000],
    [24.8232, 2.8000],
    [25.1044, 2.8000],
    [25.3856, 2.8000],
    [25.6667, 2.8000],
    [25.9479, 2.8000],
    [26.2290, 2.8000],
    [26.5102, 2.8000],
    [26.7914, 2.8000],
    [27.0725, 2.8000],
    [27.3537, 2.8000],
    [27.6348, 2.8000],
    [27.9160, 2.8000],
    [28.1971, 2.8000],
    [28.4783, 2.8000],
    [28.7595, 2.8000],
    [29.0406, 2.8000],
    [29.3218, 2.8000],
    [29.6029, 2.8000],
    [29.8841, 2.8000],
    [30.1653, 2.8000],
    [30.4464, 2.8000],
    [30.7276, 2.8000],
    [31.0087, 2.8000],
    [31.2899, 2.8000],
    [31.5710, 2.8000],
    [31.8522, 2.8000],
    [32.1334, 2.8000],
    [32.4145, 2.8000],
    [32.6957, 2.8000],
    [32.9768, 2.8000],
    [33.2580, 2.8000],
    [33.5392, 2.8000],
    [33.8203, 2.8000],
    [34.1015, 2.8000],
    [34.3826, 2.8000],
    [34.6638, 2.8000],
    [34.9449, 2.8000],
    [35.2261, 2.8000],
    [35.5073, 2.8000],
    [35.7884, 2.8000],
    [36.0696, 2.8000],
    [36.3507, 2.8000],
    [36.6319, 2.8000],
    [36.9131, 2.8000],
    [37.1942, 2.8000],
    [37.4754, 2.8000],
    [37.7565, 2.8000],
    [38.0377, 2.8000],
    [38.3188, 2.8000],
    [38.6000, 2.8000]
  ]);
}

linear_extrude(height = width, center = true)
  clip_profile();
